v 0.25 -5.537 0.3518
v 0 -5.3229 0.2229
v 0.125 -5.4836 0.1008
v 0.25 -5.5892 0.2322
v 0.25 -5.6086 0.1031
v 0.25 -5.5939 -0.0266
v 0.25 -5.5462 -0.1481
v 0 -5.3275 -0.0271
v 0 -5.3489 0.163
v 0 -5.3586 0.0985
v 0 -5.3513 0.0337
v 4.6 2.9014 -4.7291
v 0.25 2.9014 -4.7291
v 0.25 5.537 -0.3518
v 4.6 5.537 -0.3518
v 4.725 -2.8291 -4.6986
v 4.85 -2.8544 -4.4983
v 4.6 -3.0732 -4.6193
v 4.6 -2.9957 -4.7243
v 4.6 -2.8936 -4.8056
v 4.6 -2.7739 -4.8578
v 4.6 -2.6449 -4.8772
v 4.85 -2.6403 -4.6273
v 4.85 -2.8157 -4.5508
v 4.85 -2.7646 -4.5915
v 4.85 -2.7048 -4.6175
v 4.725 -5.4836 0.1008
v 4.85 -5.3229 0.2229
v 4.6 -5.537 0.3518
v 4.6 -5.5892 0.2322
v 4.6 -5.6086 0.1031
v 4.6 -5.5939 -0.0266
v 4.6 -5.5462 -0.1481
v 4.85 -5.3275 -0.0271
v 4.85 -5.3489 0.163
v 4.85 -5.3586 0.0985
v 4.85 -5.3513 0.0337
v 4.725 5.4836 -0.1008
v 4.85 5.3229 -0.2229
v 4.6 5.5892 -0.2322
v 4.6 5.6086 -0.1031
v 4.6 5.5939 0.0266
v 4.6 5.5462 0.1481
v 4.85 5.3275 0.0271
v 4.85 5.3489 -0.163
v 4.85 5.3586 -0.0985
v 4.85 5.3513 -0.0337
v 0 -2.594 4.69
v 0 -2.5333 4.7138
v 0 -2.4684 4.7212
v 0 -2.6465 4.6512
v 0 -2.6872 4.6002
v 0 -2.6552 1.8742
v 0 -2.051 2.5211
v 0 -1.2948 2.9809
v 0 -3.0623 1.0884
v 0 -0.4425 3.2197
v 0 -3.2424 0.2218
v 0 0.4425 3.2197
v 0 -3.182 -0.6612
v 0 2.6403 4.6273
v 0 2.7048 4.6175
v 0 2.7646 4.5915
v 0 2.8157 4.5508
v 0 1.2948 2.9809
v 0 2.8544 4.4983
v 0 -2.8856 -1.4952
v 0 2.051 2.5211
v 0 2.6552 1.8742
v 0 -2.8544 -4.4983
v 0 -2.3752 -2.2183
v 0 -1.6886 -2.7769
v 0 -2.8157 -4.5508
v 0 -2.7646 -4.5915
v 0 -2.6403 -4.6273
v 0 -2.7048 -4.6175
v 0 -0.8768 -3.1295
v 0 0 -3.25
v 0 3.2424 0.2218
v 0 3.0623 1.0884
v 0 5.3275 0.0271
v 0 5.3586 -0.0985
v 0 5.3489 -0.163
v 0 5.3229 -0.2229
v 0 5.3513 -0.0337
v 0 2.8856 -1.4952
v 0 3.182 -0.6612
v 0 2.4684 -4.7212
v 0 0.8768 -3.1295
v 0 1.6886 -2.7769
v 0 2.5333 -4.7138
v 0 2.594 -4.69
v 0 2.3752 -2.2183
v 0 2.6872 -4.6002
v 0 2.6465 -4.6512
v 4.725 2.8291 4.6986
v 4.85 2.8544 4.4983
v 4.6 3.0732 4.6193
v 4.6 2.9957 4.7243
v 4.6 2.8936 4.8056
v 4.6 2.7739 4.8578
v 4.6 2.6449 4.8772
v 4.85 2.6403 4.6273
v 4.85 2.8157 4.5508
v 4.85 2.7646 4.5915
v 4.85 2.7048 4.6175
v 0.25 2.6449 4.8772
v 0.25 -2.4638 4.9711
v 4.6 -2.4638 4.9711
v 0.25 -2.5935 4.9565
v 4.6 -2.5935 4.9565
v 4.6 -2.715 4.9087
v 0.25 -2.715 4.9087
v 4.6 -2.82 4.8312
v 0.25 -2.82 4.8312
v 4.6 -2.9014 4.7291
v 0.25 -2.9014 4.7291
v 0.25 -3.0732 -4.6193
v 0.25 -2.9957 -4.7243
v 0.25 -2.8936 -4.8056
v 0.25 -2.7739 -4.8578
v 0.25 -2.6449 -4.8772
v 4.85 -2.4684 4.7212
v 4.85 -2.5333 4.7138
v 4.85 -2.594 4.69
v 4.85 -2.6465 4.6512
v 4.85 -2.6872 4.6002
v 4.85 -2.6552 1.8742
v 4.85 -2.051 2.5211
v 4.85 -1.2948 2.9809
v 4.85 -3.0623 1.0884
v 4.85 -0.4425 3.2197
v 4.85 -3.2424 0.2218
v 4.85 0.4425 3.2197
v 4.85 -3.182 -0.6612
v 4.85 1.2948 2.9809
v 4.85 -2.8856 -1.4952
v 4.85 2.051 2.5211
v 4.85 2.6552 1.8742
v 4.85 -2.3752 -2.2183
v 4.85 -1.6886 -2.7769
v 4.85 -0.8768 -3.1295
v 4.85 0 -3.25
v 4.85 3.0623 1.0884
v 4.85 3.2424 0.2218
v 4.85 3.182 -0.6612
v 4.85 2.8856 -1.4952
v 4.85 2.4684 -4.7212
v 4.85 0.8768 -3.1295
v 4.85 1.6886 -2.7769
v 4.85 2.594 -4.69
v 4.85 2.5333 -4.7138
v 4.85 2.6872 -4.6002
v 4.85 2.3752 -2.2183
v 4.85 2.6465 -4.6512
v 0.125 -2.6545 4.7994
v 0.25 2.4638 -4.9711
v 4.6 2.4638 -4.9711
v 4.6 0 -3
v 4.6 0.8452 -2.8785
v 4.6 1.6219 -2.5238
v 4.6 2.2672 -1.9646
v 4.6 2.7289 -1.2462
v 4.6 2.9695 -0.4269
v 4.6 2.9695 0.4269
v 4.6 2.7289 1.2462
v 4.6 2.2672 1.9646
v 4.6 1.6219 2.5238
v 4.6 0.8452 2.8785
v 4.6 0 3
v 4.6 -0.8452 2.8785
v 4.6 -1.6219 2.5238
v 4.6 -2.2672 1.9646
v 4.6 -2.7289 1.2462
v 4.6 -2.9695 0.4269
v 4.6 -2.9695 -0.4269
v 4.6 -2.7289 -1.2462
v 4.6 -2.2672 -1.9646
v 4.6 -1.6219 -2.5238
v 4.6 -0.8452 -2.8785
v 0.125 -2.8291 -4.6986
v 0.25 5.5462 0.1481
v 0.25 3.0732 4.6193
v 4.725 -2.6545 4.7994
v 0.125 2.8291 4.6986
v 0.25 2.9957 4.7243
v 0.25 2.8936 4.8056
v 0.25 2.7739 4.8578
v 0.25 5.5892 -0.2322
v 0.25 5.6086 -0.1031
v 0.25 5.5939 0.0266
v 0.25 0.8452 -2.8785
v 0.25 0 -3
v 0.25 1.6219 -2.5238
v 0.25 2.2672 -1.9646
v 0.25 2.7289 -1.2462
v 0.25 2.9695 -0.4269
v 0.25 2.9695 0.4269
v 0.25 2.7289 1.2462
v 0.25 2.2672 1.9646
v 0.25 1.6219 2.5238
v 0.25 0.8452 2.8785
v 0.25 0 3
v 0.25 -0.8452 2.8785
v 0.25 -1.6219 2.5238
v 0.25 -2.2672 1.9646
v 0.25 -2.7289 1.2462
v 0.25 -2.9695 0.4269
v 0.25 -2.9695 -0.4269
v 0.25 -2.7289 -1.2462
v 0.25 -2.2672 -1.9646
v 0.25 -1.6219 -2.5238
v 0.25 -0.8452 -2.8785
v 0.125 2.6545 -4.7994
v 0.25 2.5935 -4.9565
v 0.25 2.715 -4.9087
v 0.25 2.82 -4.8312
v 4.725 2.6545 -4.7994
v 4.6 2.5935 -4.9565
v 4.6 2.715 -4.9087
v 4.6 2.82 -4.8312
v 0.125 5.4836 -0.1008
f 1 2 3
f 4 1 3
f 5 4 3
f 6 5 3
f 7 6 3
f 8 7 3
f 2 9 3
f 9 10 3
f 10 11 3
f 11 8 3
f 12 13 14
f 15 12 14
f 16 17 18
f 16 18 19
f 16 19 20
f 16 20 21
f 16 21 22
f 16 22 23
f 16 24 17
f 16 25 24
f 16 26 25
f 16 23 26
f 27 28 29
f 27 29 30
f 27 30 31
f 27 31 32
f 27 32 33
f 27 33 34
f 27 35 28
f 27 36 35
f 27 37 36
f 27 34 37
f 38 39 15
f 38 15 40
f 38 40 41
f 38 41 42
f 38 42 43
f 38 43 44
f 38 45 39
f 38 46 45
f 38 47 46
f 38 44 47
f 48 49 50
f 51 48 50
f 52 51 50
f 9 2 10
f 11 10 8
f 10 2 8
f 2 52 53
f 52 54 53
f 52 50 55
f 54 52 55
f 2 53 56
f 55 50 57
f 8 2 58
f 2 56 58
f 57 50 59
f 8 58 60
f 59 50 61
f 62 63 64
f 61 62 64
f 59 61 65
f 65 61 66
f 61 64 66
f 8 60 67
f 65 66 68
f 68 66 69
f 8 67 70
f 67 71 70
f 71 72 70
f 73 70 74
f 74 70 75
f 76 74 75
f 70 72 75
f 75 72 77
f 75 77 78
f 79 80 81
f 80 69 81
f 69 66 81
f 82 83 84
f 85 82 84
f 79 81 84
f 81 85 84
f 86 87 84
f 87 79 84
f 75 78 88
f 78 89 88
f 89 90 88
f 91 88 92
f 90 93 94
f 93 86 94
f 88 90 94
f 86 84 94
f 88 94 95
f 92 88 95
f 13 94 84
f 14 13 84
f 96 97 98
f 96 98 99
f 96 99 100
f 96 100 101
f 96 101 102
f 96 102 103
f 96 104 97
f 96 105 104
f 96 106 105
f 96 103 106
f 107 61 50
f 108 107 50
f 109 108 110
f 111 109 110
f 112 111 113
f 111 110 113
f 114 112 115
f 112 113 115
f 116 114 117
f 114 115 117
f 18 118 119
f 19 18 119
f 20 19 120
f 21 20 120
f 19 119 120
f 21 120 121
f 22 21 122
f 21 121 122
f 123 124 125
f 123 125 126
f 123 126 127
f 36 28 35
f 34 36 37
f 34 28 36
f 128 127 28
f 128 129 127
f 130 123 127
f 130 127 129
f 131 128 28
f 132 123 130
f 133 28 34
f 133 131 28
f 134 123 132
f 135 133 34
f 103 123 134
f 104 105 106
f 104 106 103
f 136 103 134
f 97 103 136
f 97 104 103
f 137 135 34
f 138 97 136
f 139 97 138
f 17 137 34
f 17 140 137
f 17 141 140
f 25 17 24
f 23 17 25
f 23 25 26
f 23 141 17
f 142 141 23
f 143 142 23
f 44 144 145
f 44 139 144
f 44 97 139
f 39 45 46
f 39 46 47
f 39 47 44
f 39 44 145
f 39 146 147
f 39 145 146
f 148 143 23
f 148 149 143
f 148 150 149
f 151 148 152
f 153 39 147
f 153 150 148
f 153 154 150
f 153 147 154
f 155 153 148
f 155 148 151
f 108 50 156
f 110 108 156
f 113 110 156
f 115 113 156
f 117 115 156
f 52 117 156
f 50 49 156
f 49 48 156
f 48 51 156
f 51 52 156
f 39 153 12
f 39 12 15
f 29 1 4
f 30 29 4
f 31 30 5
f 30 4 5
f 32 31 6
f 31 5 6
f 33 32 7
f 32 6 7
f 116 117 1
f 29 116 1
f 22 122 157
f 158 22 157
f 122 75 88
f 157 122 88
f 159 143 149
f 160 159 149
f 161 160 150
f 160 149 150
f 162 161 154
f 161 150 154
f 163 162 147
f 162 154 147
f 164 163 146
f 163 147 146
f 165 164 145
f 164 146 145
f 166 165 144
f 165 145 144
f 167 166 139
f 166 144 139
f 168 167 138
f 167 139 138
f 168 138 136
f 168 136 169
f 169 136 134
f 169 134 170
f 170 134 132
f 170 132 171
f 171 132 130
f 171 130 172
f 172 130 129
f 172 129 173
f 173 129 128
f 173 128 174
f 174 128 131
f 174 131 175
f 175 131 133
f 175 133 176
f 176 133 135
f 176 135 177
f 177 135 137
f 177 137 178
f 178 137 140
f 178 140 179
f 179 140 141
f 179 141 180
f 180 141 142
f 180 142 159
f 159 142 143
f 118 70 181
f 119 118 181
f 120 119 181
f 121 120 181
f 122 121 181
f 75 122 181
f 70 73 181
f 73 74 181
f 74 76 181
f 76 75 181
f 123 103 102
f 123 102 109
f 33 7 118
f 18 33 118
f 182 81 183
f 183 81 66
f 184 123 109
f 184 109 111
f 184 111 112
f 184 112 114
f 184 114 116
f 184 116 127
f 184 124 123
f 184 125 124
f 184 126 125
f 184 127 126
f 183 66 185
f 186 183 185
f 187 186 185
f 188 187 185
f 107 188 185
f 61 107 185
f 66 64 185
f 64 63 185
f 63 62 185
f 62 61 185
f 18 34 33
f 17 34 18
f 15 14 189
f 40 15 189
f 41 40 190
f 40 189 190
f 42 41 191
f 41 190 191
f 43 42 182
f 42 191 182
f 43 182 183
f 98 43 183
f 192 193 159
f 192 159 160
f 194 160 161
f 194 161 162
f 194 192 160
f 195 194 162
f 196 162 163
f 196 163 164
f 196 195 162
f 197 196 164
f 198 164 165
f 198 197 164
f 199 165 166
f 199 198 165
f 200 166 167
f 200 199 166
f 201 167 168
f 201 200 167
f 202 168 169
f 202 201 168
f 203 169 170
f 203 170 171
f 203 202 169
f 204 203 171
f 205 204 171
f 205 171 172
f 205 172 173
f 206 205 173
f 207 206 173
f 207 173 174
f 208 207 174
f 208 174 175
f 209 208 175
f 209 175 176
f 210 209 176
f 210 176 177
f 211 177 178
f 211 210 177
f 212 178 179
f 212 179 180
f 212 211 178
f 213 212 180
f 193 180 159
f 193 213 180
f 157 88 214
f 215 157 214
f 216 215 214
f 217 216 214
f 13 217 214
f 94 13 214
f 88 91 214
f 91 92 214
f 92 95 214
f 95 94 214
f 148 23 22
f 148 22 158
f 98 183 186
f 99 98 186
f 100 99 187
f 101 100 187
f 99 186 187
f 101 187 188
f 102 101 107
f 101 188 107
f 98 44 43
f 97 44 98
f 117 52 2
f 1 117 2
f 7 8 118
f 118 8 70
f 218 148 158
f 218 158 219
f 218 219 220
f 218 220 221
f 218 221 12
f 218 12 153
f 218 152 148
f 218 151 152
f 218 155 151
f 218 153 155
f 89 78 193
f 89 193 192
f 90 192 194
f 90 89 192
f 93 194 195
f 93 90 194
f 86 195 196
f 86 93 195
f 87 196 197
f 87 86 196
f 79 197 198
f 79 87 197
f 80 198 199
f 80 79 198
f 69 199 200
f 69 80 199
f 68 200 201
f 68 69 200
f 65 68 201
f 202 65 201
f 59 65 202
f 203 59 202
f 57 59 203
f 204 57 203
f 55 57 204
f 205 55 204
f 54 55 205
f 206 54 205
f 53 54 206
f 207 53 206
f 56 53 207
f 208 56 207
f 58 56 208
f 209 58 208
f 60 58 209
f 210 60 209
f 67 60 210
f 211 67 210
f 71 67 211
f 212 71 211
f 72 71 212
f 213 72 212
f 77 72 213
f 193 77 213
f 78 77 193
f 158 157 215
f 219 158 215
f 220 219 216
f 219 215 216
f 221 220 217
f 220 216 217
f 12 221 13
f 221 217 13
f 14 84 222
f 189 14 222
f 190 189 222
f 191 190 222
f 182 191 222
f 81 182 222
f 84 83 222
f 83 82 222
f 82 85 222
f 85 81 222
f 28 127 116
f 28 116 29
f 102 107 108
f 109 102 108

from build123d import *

# Parameters (mm, degrees)
SKETCH1_R           = 3
BOSS_EXTRUDE1_DEPTH = 4.85
CHAMFER1_SIZE       = 0.25


with BuildPart() as part:
    # Sketch1 → Boss-Extrude1 (new body)
    with BuildSketch(Plane(origin=(0, 0, 0), x_dir=(0, 0, -1), z_dir=(1, 0, 0))):
        with BuildLine():
            Line((4.729124762, 2.901358129), (0.351828076, 5.537031425))
            ThreePointArc((0.351828076, 5.537031425), (0.103101508, 5.608602318), (-0.148087464, 5.546221245))
            Line((-0.148087464, 5.546221245), (-4.619295838, 3.073207764))
            ThreePointArc((-4.619295838, 3.073207764), (-4.805641333, 2.893589685), (-4.877212226, 2.644863117))
            Line((-4.877212226, 2.644863117), (-4.971123914, -2.463823661))
            ThreePointArc((-4.971123914, -2.463823661), (-4.908742841, -2.715012633), (-4.729124762, -2.901358129))
            Line((-4.729124762, -2.901358129), (-0.351828076, -5.537031425))
            ThreePointArc((-0.351828076, -5.537031425), (-0.103101508, -5.608602318), (0.148087464, -5.546221245))
            Line((0.148087464, -5.546221245), (4.619295838, -3.073207764))
            ThreePointArc((4.619295838, -3.073207764), (4.805641333, -2.893589685), (4.877212226, -2.644863117))
            Line((4.877212226, -2.644863117), (4.971123914, 2.463823661))
            ThreePointArc((4.971123914, 2.463823661), (4.908742841, 2.715012633), (4.729124762, 2.901358129))
        make_face()
        Circle(SKETCH1_R, mode=Mode.SUBTRACT)
    extrude(amount=BOSS_EXTRUDE1_DEPTH)

    # Chamfer1
    chamfer1_edges = [part.edges().sort_by_distance(p)[0] for p in [
        (4.85, 5.608602318, -0.103101508),
        (0, -0.090519728, -4.92416807),
        (0, -2.893589685, -4.805641333),
        (0, -4.309714505, -2.383691651),
        (0, -5.608602318, 0.103101508),
        (0, -4.219194777, 2.540476419),
        (0, -2.715012633, 4.908742841),
        (4.85, 4.309714505, 2.383691651),
        (0, 0.090519728, 4.92416807),
        (0, 2.893589685, 4.805641333),
        (0, 4.309714505, 2.383691651),
        (0, 5.608602318, -0.103101508),
        (0, 4.219194777, -2.540476419),
        (0, 2.715012633, -4.908742841),
        (4.85, 2.893589685, 4.805641333),
        (4.85, 0.090519728, 4.92416807),
        (4.85, -2.715012633, 4.908742841),
        (4.85, -4.219194777, 2.540476419),
        (4.85, -5.608602318, 0.103101508),
        (0, 0, 3),
        (4.85, 0, 3),
        (4.85, -4.309714505, -2.383691651),
        (4.85, -2.893589685, -4.805641333),
        (4.85, -0.090519728, -4.92416807),
        (4.85, 2.715012633, -4.908742841),
        (4.85, 4.219194777, -2.540476419),
    ]]
    chamfer(chamfer1_edges, length=CHAMFER1_SIZE)


solid = part.part
